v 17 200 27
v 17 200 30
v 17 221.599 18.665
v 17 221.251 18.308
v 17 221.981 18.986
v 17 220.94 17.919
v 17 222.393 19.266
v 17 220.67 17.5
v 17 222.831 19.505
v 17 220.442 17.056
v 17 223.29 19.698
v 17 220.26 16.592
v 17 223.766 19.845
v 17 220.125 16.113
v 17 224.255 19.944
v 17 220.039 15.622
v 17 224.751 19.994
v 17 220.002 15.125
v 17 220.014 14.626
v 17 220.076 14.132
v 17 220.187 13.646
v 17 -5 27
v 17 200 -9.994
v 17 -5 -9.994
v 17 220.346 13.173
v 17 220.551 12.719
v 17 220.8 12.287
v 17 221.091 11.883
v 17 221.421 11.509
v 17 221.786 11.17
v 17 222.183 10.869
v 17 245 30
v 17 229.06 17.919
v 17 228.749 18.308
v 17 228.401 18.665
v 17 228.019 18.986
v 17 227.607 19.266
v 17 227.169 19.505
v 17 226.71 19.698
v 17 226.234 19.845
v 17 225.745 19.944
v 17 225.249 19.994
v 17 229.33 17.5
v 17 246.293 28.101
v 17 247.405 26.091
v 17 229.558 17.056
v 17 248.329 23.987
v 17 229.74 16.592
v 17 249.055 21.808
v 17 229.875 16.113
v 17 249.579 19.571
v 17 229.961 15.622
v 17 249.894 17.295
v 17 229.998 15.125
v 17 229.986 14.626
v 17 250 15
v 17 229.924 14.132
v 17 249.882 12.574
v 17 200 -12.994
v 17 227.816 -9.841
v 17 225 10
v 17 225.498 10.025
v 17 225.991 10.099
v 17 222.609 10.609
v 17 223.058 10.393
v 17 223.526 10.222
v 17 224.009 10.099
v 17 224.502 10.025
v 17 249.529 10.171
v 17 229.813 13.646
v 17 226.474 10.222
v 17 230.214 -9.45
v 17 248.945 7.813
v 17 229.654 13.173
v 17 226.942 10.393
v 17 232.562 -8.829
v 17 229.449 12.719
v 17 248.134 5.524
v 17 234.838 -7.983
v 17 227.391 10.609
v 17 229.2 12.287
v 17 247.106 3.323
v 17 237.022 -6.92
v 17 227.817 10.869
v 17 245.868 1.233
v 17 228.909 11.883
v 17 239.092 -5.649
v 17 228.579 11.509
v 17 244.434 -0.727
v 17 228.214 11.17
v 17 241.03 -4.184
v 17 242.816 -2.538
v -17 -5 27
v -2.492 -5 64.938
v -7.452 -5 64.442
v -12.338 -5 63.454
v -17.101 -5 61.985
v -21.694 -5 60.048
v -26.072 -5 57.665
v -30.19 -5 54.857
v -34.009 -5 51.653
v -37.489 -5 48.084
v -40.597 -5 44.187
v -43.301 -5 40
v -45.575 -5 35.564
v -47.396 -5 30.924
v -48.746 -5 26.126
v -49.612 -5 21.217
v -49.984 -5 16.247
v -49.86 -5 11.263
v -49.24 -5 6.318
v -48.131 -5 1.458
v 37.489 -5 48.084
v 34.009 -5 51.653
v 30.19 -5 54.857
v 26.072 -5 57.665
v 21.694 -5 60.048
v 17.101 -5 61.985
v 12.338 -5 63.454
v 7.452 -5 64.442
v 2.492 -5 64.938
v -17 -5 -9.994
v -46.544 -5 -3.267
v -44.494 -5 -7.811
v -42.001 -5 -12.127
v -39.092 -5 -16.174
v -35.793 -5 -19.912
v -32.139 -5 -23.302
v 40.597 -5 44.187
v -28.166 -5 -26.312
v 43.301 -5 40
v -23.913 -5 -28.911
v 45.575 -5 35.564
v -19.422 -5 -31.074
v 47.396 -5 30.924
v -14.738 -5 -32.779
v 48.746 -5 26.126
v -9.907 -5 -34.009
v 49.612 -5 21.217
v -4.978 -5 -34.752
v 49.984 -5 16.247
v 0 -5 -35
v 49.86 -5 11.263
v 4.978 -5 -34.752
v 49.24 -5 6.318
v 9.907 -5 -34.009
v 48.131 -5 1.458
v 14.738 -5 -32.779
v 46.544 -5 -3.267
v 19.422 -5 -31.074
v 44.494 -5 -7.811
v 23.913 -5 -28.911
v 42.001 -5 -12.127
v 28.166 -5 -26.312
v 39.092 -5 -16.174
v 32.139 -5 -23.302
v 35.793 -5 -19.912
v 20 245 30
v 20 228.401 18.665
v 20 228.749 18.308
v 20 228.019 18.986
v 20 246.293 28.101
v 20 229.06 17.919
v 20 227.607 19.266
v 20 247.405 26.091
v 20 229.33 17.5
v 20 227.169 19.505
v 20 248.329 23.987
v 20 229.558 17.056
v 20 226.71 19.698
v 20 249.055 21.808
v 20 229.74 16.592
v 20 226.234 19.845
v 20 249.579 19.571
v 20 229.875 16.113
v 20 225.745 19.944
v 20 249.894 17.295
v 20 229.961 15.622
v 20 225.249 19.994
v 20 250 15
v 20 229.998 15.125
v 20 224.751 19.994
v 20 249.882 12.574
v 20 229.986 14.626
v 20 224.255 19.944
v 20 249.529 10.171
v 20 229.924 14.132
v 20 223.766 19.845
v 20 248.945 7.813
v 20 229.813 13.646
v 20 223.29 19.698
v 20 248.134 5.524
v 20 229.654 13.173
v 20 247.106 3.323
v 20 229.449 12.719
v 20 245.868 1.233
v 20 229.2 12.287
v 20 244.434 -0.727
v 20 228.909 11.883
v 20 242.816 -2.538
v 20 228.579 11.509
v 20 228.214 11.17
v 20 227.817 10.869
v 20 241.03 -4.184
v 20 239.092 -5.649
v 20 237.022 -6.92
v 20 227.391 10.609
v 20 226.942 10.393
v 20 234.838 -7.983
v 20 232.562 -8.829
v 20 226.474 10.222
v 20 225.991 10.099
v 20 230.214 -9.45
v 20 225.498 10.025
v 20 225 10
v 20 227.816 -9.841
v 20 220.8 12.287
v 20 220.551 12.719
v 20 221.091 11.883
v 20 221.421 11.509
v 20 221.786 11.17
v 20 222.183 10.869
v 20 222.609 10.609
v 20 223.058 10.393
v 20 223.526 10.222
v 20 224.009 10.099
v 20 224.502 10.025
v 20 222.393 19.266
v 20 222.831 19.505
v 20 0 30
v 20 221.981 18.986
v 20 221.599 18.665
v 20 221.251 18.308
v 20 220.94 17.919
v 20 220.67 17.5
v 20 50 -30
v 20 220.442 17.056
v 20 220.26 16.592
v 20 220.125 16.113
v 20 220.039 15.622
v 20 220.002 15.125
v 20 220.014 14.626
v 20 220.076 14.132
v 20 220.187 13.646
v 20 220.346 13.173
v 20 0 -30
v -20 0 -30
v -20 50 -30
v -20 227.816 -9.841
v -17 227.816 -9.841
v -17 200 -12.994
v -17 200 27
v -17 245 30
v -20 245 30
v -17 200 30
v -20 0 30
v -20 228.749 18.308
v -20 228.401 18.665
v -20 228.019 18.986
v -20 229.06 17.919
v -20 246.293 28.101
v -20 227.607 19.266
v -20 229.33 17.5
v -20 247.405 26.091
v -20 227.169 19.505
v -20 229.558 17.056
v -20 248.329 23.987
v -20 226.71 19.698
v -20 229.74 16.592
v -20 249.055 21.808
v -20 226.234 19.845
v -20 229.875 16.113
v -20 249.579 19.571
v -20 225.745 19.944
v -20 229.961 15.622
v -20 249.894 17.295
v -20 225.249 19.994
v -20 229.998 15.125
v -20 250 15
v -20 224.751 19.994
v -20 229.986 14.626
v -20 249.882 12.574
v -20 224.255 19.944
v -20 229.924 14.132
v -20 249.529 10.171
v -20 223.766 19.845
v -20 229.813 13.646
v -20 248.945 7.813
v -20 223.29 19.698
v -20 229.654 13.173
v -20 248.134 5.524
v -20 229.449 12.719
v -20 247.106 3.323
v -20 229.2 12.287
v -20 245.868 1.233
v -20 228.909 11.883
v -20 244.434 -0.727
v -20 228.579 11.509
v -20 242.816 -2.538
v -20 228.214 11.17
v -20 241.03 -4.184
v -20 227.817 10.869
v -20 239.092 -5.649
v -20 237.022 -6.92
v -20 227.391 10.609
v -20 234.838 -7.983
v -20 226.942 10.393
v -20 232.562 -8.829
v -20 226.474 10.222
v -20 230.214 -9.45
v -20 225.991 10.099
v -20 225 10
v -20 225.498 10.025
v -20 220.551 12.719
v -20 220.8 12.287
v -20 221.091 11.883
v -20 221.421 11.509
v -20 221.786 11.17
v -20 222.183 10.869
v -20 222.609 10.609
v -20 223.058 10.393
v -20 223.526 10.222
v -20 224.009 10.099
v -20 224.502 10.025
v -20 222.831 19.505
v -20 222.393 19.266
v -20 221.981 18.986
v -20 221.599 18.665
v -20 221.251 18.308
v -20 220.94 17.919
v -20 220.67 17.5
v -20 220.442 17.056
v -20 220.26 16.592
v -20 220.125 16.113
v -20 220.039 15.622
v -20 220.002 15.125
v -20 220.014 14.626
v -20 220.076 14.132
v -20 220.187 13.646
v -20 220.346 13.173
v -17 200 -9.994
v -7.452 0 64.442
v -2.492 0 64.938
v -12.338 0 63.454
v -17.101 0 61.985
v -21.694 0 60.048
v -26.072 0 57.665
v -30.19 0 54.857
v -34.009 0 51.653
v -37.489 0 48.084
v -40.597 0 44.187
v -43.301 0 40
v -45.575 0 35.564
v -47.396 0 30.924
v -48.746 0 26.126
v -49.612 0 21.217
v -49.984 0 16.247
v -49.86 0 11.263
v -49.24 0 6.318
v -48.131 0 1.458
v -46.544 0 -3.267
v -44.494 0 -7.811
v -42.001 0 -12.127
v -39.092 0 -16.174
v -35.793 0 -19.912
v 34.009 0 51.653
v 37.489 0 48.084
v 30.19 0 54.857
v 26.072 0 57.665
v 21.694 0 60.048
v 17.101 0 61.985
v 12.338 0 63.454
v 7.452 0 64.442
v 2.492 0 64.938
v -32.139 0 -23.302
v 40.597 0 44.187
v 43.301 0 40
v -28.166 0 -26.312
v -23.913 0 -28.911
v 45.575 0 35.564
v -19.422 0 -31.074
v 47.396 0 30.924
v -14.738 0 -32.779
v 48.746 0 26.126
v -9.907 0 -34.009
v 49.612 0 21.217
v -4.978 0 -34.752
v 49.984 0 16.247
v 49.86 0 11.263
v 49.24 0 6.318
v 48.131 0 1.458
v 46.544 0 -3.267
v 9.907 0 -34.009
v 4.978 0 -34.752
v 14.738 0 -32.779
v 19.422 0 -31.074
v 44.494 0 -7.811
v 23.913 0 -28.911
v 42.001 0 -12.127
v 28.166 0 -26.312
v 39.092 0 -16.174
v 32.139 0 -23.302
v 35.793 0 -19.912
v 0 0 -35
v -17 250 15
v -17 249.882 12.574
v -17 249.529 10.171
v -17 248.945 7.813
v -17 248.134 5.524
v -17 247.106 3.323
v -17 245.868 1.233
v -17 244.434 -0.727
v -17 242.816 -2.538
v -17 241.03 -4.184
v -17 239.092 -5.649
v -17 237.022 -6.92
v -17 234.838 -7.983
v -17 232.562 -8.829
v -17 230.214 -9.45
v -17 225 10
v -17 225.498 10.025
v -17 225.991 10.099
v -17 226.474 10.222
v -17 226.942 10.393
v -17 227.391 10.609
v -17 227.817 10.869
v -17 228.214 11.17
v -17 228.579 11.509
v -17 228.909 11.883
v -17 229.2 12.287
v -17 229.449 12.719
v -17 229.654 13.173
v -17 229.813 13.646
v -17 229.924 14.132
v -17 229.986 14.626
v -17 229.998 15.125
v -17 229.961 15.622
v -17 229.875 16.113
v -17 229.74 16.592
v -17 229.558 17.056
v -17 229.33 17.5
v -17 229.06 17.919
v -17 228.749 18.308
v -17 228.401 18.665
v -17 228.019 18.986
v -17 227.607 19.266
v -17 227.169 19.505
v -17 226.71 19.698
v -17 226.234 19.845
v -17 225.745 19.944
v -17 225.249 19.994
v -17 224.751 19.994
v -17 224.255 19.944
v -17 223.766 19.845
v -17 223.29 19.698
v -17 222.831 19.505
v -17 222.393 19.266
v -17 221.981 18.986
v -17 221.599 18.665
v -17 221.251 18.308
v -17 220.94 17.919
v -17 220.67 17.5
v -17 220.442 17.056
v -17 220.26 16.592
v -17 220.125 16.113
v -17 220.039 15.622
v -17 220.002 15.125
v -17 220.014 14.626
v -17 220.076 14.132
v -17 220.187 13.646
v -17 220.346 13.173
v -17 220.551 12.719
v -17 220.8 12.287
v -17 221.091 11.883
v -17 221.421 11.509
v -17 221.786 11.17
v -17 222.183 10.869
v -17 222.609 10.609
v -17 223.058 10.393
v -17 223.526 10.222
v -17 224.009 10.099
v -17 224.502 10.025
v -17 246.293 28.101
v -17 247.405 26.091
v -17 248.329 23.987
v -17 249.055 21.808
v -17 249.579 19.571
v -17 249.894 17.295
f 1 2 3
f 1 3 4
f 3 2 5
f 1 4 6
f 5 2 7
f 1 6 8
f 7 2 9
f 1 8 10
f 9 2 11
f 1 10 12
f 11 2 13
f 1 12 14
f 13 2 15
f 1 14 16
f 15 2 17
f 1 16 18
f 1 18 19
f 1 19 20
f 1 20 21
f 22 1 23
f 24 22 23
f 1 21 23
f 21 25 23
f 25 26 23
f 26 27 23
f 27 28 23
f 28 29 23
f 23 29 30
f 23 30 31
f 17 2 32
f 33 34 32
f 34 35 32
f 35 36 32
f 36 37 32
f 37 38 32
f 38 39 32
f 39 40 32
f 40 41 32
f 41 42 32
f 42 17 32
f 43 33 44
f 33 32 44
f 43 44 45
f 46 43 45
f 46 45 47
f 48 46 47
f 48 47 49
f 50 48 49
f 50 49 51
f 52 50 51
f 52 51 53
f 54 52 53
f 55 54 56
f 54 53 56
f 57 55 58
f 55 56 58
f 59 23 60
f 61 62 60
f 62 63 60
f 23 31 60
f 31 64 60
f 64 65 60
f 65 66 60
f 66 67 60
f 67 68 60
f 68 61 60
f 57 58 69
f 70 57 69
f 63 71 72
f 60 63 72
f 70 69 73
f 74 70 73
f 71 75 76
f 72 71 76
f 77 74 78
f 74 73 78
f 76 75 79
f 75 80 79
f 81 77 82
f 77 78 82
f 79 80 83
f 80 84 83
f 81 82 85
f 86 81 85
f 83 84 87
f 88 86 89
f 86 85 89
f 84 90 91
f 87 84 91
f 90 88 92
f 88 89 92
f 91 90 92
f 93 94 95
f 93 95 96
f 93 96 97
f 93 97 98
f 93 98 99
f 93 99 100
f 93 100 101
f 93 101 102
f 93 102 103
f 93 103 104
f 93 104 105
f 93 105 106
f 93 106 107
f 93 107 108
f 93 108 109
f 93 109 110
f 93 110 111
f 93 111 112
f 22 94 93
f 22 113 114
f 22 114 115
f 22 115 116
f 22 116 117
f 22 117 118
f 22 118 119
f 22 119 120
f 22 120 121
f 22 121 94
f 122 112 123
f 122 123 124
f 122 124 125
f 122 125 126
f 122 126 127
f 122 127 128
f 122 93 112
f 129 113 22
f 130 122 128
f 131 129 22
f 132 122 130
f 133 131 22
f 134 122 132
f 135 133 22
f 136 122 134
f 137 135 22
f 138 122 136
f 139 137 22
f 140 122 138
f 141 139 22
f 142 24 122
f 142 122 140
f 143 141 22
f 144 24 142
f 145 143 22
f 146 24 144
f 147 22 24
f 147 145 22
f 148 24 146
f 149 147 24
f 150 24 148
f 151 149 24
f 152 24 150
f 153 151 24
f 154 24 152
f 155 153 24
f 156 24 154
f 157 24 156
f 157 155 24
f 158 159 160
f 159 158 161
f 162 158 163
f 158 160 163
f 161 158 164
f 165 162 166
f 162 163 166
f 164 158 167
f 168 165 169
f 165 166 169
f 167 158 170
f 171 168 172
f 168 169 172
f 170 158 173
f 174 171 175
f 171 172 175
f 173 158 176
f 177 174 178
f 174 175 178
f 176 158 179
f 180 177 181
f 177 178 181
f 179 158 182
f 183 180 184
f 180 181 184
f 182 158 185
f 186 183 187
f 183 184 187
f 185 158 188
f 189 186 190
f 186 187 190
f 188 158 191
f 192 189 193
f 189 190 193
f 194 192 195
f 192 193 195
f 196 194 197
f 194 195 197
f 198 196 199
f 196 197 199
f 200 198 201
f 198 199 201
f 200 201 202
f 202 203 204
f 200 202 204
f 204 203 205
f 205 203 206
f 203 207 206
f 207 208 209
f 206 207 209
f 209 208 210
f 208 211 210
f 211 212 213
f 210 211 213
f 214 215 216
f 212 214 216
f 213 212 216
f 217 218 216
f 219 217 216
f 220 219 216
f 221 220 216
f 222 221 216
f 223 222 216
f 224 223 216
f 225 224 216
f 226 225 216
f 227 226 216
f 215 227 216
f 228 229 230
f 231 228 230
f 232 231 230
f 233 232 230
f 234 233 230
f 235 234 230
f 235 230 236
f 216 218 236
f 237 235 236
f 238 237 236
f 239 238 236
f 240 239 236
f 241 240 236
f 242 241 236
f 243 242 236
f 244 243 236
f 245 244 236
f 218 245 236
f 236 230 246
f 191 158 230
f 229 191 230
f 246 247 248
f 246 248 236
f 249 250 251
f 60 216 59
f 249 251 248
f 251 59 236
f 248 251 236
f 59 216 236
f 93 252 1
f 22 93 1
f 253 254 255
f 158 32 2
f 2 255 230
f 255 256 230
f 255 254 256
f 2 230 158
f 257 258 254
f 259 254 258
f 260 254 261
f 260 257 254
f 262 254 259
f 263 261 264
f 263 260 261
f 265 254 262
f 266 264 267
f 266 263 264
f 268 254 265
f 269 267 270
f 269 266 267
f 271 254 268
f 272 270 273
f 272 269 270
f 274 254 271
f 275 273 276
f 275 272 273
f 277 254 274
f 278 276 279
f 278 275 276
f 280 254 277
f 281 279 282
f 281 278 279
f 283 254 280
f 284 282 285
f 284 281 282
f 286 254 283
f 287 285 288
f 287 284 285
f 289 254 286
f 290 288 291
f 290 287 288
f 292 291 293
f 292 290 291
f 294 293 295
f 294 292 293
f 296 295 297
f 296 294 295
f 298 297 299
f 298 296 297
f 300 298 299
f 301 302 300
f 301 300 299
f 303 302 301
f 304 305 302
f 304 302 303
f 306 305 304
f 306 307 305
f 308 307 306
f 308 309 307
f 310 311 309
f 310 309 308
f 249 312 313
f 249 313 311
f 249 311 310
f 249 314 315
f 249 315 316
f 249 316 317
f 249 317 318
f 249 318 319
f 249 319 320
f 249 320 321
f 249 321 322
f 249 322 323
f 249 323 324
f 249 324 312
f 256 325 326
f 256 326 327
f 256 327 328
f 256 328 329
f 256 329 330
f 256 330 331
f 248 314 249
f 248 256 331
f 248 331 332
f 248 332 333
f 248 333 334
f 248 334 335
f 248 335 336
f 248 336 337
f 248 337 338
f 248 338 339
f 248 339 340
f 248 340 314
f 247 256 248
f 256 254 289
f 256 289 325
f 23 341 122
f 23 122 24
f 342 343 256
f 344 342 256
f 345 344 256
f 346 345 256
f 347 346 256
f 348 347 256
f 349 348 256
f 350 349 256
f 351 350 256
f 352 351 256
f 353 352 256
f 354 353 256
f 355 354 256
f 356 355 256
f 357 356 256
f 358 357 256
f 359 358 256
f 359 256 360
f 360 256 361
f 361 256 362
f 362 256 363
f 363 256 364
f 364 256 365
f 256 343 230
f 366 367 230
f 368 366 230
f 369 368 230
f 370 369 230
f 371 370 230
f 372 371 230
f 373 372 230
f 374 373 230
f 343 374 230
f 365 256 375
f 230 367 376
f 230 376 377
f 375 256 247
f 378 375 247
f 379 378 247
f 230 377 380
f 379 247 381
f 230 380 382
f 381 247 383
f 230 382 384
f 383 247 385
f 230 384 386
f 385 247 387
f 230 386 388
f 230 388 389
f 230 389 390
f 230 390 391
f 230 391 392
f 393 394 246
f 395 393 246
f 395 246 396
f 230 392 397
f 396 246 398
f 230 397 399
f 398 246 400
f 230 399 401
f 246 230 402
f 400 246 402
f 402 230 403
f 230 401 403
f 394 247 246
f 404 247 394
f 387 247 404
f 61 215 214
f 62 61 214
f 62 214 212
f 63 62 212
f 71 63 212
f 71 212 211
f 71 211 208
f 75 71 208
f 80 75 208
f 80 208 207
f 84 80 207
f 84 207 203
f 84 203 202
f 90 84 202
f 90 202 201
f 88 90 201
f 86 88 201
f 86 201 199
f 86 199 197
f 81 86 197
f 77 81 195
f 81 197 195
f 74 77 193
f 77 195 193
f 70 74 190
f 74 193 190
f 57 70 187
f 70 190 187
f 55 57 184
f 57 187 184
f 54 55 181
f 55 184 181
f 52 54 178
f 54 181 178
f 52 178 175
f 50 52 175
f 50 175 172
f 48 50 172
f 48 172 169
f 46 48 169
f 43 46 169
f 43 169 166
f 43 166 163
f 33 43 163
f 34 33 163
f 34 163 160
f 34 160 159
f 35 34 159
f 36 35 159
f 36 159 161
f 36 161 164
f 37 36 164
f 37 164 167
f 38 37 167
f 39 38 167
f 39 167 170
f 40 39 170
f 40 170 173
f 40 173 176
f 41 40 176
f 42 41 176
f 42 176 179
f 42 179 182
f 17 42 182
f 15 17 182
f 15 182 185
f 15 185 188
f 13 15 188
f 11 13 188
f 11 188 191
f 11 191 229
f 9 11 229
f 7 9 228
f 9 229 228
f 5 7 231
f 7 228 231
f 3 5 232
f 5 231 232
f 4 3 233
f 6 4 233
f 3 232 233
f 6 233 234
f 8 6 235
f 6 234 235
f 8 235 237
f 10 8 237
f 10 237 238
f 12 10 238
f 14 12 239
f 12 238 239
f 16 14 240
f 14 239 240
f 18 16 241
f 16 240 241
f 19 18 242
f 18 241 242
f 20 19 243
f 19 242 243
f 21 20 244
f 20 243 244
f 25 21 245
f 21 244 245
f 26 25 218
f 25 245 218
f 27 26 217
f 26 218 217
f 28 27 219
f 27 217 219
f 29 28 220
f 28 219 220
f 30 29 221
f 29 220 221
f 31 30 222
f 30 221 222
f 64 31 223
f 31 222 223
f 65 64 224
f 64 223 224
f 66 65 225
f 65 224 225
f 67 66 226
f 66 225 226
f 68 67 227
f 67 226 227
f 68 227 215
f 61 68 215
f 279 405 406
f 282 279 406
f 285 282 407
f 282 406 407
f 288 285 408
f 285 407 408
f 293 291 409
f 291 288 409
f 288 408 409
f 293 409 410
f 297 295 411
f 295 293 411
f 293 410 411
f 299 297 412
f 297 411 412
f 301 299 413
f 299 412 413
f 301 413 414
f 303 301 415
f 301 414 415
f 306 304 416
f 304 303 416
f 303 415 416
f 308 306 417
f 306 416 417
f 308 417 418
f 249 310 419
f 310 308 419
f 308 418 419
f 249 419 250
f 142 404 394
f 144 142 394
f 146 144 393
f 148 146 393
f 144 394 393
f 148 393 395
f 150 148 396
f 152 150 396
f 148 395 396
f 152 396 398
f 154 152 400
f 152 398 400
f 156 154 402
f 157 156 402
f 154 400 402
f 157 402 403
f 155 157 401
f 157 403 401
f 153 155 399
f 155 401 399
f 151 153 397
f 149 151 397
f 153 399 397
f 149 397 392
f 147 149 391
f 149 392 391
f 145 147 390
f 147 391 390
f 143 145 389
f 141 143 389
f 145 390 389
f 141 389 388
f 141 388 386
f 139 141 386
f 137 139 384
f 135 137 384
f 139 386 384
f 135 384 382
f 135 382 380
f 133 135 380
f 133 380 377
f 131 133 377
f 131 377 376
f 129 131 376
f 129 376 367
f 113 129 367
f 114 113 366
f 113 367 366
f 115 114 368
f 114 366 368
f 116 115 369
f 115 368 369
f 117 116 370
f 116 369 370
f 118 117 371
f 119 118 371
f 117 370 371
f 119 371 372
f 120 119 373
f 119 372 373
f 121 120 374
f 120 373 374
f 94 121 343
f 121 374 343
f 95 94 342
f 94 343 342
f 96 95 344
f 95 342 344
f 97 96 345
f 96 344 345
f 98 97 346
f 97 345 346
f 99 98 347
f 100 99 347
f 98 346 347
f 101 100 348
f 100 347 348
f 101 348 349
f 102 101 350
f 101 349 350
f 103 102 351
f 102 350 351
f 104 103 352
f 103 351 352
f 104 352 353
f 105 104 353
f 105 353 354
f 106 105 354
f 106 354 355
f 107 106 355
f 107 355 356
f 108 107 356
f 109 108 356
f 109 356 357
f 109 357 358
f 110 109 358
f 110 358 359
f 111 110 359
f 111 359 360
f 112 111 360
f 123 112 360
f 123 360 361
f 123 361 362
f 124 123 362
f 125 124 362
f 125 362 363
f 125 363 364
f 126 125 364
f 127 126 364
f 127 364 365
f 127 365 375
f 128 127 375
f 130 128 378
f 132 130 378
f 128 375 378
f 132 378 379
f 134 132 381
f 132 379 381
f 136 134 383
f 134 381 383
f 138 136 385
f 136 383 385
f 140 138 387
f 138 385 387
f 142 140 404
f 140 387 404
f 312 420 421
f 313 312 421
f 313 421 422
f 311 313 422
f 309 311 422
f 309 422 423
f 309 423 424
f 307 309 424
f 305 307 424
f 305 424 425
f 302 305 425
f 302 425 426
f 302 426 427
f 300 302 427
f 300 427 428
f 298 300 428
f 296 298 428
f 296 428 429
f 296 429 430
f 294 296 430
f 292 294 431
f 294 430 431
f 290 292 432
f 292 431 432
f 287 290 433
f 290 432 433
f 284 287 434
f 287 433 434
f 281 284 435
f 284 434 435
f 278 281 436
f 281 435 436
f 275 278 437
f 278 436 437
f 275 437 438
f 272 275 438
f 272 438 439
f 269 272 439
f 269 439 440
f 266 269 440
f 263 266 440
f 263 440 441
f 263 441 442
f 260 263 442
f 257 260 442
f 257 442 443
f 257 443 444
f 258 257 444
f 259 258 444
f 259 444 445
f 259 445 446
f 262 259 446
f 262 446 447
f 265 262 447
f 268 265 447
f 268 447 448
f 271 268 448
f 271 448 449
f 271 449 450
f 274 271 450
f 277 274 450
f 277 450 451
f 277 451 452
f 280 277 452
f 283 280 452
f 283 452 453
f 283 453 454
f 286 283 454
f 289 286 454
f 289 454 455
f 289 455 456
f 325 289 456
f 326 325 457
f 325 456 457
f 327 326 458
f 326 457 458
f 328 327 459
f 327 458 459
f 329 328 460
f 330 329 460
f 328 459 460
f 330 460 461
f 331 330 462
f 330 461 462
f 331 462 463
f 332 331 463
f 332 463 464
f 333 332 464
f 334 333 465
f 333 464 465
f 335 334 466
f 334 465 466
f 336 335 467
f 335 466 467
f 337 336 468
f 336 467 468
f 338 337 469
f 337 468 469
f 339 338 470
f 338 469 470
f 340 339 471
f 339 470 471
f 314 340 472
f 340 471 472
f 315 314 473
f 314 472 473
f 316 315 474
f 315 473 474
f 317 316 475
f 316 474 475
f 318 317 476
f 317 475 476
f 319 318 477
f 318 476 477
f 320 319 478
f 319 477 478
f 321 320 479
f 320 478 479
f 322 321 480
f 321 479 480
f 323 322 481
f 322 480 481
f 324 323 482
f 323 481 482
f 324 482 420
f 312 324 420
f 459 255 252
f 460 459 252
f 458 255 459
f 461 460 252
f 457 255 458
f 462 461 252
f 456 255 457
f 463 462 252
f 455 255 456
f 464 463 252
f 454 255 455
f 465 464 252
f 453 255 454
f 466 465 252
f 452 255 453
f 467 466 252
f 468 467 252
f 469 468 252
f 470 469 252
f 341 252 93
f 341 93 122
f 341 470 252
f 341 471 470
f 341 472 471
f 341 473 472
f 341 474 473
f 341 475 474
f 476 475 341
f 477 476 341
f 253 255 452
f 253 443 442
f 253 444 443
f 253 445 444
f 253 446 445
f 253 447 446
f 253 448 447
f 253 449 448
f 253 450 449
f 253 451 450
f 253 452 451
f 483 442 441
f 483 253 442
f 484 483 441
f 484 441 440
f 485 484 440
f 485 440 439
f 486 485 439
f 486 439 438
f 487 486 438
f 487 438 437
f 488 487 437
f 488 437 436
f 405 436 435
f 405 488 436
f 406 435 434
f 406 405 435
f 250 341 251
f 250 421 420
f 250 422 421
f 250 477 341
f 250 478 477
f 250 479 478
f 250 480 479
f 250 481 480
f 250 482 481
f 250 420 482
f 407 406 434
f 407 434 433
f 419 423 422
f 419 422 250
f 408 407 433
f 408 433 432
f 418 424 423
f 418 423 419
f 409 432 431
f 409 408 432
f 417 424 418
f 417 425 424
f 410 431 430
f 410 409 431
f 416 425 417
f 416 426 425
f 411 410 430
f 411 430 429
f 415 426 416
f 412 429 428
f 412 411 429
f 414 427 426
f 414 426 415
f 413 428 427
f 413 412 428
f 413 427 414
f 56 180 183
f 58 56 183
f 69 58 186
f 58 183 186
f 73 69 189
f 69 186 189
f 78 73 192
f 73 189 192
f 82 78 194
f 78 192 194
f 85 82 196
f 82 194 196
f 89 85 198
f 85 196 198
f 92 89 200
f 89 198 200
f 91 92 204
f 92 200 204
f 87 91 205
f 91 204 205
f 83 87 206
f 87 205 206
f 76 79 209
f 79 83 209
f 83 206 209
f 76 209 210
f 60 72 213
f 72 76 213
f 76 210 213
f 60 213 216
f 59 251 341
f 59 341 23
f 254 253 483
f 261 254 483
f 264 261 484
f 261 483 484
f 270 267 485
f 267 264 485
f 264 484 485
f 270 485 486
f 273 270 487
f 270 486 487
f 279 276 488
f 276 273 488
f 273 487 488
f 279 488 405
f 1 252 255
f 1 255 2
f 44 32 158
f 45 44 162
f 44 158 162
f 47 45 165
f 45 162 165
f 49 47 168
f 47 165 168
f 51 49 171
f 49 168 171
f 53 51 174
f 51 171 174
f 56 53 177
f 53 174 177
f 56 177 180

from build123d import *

# Parameters (mm, degrees)
CROQUIS1_W              = 40
CROQUIS1_H              = 60
SALIENTE_EXTRUIR1_DEPTH = 250
CROQUIS2_W              = 34
CROQUIS2_H              = 60
CORTAR_EXTRUIR1_DEPTH   = 50
CROQUIS3_R              = 5
CORTAR_EXTRUIR2_DEPTH   = 255.95097568
CORTAR_EXTRUIR5_DEPTH   = 255.95097568
CROQUIS6_R              = 50
SALIENTE_EXTRUIR2_DEPTH = 5
CROQUIS7_W              = 34
CROQUIS7_H              = 36.99441271
CORTAR_EXTRUIR6_DEPTH   = 221.794021658


with BuildPart() as part:
    # Croquis1 → Saliente-Extruir1 (new body)
    with BuildSketch(Plane(origin=(0, 0, 0), x_dir=(1, 0, 0), z_dir=(0, 1, 0))):
        Rectangle(CROQUIS1_W, CROQUIS1_H)
    extrude(amount=SALIENTE_EXTRUIR1_DEPTH)

    # Croquis2 → Cortar-Extruir1 (cut)
    with BuildSketch(Plane(origin=(0, 250, 0), x_dir=(1, 0, 0), z_dir=(0, 1, 0))):
        Rectangle(CROQUIS2_W, CROQUIS2_H)
    extrude(amount=-CORTAR_EXTRUIR1_DEPTH, mode=Mode.SUBTRACT)

    # Croquis3 → Cortar-Extruir2 (cut, through all)
    with BuildSketch(Plane(origin=(20, 0, 0), x_dir=(0, 0, -1), z_dir=(1, 0, 0))):
        with Locations((-15, 225)):
            Circle(CROQUIS3_R)
    extrude(amount=-CORTAR_EXTRUIR2_DEPTH, mode=Mode.SUBTRACT)

    # Croquis5 → Cortar-Extruir5 (cut, through all)
    with BuildSketch(Plane(origin=(20, 0, 0), x_dir=(0, 0, -1), z_dir=(1, 0, 0))):
        with BuildLine():
            Line((9.840871205, 227.816224024), (30, 50))
            Line((30, 50), (30, 250))
            Line((30, 250), (-15.00000011, 250))
            ThreePointArc((-15.00000011, 250), (1.652243042, 243.646790653), (9.840871205, 227.816224024))
        make_face()
        with BuildLine():
            ThreePointArc((-30, 245), (-22.905694203, 248.717082434), (-15.00000011, 250))
            Line((-15.00000011, 250), (-30, 250))
            Line((-30, 250), (-30, 245))
        make_face()
    extrude(amount=-CORTAR_EXTRUIR5_DEPTH, mode=Mode.SUBTRACT)

    # Croquis6 → Saliente-Extruir2 (add)
    with BuildSketch(Plane.XZ):
        with Locations(Location((0, 15, 0), (0, 0, 270))):
            Circle(CROQUIS6_R)
    extrude(amount=SALIENTE_EXTRUIR2_DEPTH)

    # Croquis7 → Cortar-Extruir6 (cut, through all)
    with BuildSketch(Plane(origin=(0, 200, 0), x_dir=(1, 0, 0), z_dir=(0, 1, 0))):
        with Locations((0, -8.502793645)):
            Rectangle(CROQUIS7_W, CROQUIS7_H)
    extrude(amount=-CORTAR_EXTRUIR6_DEPTH, mode=Mode.SUBTRACT)


solid = part.part
